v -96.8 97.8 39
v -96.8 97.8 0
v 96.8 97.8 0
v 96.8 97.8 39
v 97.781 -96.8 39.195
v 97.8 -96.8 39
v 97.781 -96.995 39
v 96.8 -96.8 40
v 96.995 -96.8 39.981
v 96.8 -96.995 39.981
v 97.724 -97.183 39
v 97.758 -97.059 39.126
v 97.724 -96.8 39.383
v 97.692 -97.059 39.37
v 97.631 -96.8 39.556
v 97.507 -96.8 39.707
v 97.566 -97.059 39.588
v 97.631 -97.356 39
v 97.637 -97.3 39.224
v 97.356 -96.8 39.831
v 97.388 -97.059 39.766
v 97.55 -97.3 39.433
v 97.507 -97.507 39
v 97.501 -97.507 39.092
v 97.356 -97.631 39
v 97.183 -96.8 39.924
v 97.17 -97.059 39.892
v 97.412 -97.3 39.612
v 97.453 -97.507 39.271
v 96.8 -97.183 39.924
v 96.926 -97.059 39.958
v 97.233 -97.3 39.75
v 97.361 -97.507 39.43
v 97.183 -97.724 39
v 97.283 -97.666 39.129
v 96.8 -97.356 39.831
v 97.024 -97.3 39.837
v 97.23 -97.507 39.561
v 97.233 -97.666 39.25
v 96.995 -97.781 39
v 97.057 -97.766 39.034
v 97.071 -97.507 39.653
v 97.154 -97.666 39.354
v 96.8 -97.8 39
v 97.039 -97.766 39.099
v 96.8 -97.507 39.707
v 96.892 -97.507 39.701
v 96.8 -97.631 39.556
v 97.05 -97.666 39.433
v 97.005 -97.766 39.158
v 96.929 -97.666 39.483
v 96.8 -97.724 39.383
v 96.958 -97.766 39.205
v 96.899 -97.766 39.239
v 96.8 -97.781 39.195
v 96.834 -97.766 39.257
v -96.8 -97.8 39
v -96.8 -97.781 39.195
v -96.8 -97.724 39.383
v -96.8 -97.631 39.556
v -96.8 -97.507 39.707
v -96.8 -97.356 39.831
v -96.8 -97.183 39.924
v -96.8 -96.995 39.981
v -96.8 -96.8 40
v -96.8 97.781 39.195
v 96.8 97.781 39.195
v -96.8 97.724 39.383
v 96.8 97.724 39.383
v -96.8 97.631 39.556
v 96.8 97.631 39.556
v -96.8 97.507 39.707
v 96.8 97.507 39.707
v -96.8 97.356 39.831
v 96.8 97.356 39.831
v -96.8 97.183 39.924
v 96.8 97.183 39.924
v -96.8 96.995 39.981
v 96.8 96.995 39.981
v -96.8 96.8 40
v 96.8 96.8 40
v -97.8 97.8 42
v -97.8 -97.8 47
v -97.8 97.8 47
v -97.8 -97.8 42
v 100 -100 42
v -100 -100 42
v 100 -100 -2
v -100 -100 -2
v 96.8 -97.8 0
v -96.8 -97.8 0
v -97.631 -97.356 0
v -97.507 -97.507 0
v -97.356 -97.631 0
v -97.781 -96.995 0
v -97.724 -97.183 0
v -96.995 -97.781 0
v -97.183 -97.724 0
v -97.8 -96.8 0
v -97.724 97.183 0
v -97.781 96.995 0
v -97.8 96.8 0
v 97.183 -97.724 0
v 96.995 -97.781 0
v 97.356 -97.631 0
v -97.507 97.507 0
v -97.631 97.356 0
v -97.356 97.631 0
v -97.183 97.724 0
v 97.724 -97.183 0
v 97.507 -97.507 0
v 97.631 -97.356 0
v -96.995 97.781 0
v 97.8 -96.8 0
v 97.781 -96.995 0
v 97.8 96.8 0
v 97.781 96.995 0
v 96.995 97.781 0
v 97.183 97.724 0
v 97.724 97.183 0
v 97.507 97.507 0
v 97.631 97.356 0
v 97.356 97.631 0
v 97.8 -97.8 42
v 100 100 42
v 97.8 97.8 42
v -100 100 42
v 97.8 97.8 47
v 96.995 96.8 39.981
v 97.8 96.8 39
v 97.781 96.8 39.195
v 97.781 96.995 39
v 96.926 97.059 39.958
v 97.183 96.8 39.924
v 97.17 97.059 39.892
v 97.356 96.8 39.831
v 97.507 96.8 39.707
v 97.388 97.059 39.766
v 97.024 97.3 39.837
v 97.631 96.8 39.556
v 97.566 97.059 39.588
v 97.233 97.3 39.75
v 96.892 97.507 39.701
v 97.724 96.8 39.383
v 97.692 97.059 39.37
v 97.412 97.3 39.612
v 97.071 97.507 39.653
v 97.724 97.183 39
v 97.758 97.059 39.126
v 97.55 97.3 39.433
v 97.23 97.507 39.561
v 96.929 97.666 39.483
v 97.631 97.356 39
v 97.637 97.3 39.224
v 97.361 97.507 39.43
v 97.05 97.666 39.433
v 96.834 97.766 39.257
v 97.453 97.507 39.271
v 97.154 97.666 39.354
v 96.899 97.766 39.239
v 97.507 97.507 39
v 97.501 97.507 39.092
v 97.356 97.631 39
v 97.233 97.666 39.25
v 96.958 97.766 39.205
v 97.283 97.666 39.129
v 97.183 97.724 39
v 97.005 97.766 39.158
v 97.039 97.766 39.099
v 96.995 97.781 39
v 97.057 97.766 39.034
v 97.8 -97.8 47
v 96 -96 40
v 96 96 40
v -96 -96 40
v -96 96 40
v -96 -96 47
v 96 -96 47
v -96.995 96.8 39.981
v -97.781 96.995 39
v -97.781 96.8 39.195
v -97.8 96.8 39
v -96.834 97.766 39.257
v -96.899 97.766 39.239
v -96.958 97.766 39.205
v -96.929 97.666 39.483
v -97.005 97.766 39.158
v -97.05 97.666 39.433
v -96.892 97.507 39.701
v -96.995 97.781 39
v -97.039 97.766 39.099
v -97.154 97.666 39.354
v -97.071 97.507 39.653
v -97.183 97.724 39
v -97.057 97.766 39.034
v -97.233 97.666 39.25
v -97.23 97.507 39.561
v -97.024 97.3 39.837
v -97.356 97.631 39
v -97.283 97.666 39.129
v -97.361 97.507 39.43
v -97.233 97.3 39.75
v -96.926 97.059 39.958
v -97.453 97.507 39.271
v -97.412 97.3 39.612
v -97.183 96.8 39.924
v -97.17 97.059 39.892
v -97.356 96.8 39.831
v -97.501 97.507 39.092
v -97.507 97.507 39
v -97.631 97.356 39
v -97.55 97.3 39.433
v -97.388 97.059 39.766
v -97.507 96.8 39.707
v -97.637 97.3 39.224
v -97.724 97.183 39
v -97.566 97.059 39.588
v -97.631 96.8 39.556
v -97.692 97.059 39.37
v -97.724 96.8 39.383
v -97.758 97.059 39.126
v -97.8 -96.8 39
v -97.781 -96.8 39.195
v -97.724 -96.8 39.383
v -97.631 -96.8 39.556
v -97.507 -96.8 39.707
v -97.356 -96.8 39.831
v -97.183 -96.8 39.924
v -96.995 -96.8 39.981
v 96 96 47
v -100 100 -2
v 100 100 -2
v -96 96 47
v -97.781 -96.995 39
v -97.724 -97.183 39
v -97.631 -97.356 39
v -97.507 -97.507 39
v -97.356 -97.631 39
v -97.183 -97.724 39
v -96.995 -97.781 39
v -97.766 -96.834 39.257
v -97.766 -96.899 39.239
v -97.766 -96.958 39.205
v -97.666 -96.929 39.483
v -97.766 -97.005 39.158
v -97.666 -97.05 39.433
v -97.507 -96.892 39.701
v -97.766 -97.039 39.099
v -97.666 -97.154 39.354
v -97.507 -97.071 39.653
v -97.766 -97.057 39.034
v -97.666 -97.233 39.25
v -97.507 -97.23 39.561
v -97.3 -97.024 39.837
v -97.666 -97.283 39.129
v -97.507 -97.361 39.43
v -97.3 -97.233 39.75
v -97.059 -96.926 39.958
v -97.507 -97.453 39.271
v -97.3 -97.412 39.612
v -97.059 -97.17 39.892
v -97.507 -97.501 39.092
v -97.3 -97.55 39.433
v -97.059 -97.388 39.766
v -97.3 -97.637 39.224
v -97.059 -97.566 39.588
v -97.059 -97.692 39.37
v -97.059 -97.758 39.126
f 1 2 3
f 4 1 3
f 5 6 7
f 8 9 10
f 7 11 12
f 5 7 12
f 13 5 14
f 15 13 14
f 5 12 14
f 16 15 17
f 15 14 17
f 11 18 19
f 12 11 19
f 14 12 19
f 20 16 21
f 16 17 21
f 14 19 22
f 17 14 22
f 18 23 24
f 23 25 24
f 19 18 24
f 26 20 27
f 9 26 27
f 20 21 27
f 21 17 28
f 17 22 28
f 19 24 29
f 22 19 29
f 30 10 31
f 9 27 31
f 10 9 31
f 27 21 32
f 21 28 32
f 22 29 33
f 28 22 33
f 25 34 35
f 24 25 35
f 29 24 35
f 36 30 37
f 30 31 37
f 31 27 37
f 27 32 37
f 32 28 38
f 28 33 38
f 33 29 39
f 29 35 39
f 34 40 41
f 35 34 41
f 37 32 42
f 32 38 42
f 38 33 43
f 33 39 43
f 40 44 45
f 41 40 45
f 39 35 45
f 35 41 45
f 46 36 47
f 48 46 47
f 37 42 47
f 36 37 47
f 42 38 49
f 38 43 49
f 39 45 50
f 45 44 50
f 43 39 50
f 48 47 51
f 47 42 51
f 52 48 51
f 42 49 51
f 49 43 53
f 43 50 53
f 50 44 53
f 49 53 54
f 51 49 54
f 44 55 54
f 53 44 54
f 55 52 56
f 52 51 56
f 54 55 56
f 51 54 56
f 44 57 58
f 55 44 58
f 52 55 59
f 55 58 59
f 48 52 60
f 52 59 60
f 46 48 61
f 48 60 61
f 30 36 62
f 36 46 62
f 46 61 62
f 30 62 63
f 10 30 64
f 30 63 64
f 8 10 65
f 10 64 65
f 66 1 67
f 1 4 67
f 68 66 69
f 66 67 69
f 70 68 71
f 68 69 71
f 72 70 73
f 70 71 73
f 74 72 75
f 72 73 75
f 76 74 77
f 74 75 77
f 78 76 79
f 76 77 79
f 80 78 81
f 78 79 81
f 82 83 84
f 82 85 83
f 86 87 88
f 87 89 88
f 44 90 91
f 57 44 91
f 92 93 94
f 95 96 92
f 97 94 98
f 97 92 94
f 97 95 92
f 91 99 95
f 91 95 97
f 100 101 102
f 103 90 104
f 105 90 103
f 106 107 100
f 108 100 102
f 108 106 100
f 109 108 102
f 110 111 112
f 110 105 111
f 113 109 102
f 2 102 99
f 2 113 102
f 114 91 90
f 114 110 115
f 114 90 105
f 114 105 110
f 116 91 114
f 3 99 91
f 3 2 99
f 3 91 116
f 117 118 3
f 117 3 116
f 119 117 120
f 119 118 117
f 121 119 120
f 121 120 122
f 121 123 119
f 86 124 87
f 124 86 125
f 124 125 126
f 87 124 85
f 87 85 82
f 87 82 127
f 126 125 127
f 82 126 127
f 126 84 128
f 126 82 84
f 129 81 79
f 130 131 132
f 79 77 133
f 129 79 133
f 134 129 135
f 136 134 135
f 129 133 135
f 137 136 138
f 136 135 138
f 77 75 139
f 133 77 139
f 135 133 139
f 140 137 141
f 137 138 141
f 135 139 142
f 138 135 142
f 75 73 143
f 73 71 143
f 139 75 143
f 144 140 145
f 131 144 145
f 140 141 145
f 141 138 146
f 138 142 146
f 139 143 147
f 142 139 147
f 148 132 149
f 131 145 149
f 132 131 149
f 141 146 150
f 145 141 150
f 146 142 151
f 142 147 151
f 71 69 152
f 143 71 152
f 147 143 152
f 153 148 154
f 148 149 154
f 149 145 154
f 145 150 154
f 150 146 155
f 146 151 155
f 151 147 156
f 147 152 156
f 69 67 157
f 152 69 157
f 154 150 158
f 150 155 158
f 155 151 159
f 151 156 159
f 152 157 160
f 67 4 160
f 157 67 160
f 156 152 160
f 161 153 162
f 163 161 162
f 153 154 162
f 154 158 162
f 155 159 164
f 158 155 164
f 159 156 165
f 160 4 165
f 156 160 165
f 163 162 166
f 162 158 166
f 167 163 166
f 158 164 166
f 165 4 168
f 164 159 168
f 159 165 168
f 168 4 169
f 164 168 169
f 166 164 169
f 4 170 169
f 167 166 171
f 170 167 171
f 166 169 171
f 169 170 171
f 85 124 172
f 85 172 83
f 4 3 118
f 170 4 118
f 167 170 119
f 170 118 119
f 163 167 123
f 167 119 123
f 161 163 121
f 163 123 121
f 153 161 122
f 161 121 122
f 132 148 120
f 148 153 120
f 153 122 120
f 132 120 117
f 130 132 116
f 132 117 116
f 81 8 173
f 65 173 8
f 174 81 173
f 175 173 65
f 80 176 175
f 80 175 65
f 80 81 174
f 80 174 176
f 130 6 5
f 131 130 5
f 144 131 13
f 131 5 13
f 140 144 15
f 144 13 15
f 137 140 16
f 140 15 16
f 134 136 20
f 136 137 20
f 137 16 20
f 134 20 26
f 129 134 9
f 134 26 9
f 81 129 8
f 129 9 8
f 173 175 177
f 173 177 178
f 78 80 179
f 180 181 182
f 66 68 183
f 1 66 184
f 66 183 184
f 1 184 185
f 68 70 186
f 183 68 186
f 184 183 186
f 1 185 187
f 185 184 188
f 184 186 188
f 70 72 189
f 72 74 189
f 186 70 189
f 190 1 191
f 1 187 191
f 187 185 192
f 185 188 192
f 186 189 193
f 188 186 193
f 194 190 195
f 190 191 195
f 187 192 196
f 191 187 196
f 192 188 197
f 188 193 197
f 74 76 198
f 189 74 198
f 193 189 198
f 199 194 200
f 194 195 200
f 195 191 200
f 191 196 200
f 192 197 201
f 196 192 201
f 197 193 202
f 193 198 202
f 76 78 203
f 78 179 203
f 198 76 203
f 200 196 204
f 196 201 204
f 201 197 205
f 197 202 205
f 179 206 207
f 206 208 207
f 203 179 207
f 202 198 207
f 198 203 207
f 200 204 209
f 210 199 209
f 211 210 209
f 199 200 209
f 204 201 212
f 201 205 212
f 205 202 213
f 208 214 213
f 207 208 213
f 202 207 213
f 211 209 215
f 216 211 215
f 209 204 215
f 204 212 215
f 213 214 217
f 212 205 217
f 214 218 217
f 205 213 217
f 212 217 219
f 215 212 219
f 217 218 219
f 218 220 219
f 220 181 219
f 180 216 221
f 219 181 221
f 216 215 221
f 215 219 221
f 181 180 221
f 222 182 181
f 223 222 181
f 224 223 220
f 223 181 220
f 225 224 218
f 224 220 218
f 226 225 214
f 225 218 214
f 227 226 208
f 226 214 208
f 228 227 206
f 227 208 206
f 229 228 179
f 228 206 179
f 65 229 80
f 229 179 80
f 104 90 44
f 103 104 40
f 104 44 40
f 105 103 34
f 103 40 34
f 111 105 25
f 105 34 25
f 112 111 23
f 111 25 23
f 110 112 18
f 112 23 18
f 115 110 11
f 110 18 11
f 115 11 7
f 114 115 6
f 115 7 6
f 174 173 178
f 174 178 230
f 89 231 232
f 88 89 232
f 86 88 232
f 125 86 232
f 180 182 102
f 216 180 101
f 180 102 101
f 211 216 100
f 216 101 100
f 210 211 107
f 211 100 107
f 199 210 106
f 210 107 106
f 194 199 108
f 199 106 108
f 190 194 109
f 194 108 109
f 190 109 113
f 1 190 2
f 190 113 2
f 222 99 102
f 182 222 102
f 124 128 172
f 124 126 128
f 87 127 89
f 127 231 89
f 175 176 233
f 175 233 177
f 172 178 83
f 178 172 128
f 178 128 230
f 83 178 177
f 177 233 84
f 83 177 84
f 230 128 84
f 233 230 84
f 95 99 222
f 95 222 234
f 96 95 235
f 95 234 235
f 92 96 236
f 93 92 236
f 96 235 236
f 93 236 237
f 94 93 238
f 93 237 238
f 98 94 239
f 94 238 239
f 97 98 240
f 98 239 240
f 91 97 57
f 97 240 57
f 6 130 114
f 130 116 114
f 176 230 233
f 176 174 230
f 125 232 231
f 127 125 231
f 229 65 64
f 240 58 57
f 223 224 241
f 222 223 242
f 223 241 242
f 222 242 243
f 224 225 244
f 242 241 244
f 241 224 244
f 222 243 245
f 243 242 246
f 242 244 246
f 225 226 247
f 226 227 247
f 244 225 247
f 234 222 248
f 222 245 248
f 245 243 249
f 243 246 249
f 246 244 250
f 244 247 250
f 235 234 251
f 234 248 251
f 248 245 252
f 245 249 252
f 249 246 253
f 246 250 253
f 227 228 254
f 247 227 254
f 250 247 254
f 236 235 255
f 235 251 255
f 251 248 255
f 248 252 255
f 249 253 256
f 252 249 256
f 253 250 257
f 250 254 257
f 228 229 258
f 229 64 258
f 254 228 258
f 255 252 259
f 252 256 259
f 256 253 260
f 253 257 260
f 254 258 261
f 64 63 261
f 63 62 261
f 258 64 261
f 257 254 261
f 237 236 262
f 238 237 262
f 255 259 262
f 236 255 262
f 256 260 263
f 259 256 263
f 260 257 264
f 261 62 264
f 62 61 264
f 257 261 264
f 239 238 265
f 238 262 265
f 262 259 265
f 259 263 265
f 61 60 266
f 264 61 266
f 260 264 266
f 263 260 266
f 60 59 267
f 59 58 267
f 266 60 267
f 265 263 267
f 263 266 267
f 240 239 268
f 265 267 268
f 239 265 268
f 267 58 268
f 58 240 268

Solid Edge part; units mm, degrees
sketch "Sketch1" plane through (0, 0, 0) normal (0, 0, 1) x (1, 0, 0)
  line L0 (-100, 100) -> (-100, -100)
  line L1 (-100, -100) -> (100, -100)
  line L2 (100, -100) -> (100, 100)
  line L3 (100, 100) -> (-100, 100)
extrude "Protrusion1" add sketch "Sketch1" along normal blind 40
sketch "Sketch2" plane through (0, 0, 0) normal (0, 0, 1) x (1, 0, 0)
  line L0 (-97.8, 97.8) -> (-97.8, -97.8)
  line L1 (-97.8, -97.8) -> (97.8, -97.8)
  line L2 (97.8, -97.8) -> (97.8, 97.8)
  line L3 (97.8, 97.8) -> (-97.8, 97.8)
extrude "ExtrudedCutout_1" cut sketch "Sketch2" along normal blind 45
sketch "Sketch3" plane through (0, 0, 0) normal (0, 0, 1) x (1, 0, 0)
  line L0 (-100, -100) -> (100, -100)
  line L1 (100, -100) -> (100, 100)
  line L2 (100, 100) -> (-100, 100)
  line L3 (-100, 100) -> (-100, -100)
extrude "Boden" add sketch "Sketch3" against normal blind 2
sketch "Sketch4" plane through (0, 0, 40) normal (0, 0, 1) x (0, -1, 0)
  line L0 (-97.8, -97.8) -> (-97.8, 97.8)
  line L1 (-97.8, 97.8) -> (97.8, 97.8)
  line L2 (97.8, 97.8) -> (97.8, -97.8)
  line L3 (97.8, -97.8) -> (-97.8, -97.8)
  line L4 (-100, -100) -> (-100, 100)
  line L5 (-100, 100) -> (100, 100)
  line L6 (100, 100) -> (100, -100)
  line L7 (100, -100) -> (-100, -100)
  dimension "D1" = 200
  dimension "D2" = 200
  dimension "D3" = 195.6
  dimension "D4" = 195.6
extrude "Verbindung" add sketch "Sketch4" along normal blind 2
sketch "Sketch5" plane through (0, 0, 40) normal (0, 0, 1) x (0, -1, 0)
  line L0 (-96, 96) -> (-96, -96)
  line L1 (-96, -96) -> (96, -96)
  line L2 (96, -96) -> (96, 96)
  line L3 (96, 96) -> (-96, 96)
  line L4 (-97.8, -97.8) -> (-97.8, 97.8)
  line L5 (-97.8, 97.8) -> (97.8, 97.8)
  line L6 (97.8, 97.8) -> (97.8, -97.8)
  line L7 (97.8, -97.8) -> (-97.8, -97.8)
  dimension "D1" = 192
  dimension "D2" = 192
extrude "ExtrudedProtrusion_7" add sketch "Sketch5" along normal blind 7
fillet "Round_1" radius 1 1 edges at (97.8, 0, 40)
fillet "Round_2" radius 1 9 edges at (-0.5, -97.8, 40) (97.5071, -97.8, 39.7071) (97.8, -97.8, 19.5) (-97.8, 0, 40) (-97.8, -97.8, 20) (-0.5, 97.8, 40) (97.5071, 97.8, 39.7071) (97.8, 97.8, 19.5) (-97.8, 97.8, 20)
